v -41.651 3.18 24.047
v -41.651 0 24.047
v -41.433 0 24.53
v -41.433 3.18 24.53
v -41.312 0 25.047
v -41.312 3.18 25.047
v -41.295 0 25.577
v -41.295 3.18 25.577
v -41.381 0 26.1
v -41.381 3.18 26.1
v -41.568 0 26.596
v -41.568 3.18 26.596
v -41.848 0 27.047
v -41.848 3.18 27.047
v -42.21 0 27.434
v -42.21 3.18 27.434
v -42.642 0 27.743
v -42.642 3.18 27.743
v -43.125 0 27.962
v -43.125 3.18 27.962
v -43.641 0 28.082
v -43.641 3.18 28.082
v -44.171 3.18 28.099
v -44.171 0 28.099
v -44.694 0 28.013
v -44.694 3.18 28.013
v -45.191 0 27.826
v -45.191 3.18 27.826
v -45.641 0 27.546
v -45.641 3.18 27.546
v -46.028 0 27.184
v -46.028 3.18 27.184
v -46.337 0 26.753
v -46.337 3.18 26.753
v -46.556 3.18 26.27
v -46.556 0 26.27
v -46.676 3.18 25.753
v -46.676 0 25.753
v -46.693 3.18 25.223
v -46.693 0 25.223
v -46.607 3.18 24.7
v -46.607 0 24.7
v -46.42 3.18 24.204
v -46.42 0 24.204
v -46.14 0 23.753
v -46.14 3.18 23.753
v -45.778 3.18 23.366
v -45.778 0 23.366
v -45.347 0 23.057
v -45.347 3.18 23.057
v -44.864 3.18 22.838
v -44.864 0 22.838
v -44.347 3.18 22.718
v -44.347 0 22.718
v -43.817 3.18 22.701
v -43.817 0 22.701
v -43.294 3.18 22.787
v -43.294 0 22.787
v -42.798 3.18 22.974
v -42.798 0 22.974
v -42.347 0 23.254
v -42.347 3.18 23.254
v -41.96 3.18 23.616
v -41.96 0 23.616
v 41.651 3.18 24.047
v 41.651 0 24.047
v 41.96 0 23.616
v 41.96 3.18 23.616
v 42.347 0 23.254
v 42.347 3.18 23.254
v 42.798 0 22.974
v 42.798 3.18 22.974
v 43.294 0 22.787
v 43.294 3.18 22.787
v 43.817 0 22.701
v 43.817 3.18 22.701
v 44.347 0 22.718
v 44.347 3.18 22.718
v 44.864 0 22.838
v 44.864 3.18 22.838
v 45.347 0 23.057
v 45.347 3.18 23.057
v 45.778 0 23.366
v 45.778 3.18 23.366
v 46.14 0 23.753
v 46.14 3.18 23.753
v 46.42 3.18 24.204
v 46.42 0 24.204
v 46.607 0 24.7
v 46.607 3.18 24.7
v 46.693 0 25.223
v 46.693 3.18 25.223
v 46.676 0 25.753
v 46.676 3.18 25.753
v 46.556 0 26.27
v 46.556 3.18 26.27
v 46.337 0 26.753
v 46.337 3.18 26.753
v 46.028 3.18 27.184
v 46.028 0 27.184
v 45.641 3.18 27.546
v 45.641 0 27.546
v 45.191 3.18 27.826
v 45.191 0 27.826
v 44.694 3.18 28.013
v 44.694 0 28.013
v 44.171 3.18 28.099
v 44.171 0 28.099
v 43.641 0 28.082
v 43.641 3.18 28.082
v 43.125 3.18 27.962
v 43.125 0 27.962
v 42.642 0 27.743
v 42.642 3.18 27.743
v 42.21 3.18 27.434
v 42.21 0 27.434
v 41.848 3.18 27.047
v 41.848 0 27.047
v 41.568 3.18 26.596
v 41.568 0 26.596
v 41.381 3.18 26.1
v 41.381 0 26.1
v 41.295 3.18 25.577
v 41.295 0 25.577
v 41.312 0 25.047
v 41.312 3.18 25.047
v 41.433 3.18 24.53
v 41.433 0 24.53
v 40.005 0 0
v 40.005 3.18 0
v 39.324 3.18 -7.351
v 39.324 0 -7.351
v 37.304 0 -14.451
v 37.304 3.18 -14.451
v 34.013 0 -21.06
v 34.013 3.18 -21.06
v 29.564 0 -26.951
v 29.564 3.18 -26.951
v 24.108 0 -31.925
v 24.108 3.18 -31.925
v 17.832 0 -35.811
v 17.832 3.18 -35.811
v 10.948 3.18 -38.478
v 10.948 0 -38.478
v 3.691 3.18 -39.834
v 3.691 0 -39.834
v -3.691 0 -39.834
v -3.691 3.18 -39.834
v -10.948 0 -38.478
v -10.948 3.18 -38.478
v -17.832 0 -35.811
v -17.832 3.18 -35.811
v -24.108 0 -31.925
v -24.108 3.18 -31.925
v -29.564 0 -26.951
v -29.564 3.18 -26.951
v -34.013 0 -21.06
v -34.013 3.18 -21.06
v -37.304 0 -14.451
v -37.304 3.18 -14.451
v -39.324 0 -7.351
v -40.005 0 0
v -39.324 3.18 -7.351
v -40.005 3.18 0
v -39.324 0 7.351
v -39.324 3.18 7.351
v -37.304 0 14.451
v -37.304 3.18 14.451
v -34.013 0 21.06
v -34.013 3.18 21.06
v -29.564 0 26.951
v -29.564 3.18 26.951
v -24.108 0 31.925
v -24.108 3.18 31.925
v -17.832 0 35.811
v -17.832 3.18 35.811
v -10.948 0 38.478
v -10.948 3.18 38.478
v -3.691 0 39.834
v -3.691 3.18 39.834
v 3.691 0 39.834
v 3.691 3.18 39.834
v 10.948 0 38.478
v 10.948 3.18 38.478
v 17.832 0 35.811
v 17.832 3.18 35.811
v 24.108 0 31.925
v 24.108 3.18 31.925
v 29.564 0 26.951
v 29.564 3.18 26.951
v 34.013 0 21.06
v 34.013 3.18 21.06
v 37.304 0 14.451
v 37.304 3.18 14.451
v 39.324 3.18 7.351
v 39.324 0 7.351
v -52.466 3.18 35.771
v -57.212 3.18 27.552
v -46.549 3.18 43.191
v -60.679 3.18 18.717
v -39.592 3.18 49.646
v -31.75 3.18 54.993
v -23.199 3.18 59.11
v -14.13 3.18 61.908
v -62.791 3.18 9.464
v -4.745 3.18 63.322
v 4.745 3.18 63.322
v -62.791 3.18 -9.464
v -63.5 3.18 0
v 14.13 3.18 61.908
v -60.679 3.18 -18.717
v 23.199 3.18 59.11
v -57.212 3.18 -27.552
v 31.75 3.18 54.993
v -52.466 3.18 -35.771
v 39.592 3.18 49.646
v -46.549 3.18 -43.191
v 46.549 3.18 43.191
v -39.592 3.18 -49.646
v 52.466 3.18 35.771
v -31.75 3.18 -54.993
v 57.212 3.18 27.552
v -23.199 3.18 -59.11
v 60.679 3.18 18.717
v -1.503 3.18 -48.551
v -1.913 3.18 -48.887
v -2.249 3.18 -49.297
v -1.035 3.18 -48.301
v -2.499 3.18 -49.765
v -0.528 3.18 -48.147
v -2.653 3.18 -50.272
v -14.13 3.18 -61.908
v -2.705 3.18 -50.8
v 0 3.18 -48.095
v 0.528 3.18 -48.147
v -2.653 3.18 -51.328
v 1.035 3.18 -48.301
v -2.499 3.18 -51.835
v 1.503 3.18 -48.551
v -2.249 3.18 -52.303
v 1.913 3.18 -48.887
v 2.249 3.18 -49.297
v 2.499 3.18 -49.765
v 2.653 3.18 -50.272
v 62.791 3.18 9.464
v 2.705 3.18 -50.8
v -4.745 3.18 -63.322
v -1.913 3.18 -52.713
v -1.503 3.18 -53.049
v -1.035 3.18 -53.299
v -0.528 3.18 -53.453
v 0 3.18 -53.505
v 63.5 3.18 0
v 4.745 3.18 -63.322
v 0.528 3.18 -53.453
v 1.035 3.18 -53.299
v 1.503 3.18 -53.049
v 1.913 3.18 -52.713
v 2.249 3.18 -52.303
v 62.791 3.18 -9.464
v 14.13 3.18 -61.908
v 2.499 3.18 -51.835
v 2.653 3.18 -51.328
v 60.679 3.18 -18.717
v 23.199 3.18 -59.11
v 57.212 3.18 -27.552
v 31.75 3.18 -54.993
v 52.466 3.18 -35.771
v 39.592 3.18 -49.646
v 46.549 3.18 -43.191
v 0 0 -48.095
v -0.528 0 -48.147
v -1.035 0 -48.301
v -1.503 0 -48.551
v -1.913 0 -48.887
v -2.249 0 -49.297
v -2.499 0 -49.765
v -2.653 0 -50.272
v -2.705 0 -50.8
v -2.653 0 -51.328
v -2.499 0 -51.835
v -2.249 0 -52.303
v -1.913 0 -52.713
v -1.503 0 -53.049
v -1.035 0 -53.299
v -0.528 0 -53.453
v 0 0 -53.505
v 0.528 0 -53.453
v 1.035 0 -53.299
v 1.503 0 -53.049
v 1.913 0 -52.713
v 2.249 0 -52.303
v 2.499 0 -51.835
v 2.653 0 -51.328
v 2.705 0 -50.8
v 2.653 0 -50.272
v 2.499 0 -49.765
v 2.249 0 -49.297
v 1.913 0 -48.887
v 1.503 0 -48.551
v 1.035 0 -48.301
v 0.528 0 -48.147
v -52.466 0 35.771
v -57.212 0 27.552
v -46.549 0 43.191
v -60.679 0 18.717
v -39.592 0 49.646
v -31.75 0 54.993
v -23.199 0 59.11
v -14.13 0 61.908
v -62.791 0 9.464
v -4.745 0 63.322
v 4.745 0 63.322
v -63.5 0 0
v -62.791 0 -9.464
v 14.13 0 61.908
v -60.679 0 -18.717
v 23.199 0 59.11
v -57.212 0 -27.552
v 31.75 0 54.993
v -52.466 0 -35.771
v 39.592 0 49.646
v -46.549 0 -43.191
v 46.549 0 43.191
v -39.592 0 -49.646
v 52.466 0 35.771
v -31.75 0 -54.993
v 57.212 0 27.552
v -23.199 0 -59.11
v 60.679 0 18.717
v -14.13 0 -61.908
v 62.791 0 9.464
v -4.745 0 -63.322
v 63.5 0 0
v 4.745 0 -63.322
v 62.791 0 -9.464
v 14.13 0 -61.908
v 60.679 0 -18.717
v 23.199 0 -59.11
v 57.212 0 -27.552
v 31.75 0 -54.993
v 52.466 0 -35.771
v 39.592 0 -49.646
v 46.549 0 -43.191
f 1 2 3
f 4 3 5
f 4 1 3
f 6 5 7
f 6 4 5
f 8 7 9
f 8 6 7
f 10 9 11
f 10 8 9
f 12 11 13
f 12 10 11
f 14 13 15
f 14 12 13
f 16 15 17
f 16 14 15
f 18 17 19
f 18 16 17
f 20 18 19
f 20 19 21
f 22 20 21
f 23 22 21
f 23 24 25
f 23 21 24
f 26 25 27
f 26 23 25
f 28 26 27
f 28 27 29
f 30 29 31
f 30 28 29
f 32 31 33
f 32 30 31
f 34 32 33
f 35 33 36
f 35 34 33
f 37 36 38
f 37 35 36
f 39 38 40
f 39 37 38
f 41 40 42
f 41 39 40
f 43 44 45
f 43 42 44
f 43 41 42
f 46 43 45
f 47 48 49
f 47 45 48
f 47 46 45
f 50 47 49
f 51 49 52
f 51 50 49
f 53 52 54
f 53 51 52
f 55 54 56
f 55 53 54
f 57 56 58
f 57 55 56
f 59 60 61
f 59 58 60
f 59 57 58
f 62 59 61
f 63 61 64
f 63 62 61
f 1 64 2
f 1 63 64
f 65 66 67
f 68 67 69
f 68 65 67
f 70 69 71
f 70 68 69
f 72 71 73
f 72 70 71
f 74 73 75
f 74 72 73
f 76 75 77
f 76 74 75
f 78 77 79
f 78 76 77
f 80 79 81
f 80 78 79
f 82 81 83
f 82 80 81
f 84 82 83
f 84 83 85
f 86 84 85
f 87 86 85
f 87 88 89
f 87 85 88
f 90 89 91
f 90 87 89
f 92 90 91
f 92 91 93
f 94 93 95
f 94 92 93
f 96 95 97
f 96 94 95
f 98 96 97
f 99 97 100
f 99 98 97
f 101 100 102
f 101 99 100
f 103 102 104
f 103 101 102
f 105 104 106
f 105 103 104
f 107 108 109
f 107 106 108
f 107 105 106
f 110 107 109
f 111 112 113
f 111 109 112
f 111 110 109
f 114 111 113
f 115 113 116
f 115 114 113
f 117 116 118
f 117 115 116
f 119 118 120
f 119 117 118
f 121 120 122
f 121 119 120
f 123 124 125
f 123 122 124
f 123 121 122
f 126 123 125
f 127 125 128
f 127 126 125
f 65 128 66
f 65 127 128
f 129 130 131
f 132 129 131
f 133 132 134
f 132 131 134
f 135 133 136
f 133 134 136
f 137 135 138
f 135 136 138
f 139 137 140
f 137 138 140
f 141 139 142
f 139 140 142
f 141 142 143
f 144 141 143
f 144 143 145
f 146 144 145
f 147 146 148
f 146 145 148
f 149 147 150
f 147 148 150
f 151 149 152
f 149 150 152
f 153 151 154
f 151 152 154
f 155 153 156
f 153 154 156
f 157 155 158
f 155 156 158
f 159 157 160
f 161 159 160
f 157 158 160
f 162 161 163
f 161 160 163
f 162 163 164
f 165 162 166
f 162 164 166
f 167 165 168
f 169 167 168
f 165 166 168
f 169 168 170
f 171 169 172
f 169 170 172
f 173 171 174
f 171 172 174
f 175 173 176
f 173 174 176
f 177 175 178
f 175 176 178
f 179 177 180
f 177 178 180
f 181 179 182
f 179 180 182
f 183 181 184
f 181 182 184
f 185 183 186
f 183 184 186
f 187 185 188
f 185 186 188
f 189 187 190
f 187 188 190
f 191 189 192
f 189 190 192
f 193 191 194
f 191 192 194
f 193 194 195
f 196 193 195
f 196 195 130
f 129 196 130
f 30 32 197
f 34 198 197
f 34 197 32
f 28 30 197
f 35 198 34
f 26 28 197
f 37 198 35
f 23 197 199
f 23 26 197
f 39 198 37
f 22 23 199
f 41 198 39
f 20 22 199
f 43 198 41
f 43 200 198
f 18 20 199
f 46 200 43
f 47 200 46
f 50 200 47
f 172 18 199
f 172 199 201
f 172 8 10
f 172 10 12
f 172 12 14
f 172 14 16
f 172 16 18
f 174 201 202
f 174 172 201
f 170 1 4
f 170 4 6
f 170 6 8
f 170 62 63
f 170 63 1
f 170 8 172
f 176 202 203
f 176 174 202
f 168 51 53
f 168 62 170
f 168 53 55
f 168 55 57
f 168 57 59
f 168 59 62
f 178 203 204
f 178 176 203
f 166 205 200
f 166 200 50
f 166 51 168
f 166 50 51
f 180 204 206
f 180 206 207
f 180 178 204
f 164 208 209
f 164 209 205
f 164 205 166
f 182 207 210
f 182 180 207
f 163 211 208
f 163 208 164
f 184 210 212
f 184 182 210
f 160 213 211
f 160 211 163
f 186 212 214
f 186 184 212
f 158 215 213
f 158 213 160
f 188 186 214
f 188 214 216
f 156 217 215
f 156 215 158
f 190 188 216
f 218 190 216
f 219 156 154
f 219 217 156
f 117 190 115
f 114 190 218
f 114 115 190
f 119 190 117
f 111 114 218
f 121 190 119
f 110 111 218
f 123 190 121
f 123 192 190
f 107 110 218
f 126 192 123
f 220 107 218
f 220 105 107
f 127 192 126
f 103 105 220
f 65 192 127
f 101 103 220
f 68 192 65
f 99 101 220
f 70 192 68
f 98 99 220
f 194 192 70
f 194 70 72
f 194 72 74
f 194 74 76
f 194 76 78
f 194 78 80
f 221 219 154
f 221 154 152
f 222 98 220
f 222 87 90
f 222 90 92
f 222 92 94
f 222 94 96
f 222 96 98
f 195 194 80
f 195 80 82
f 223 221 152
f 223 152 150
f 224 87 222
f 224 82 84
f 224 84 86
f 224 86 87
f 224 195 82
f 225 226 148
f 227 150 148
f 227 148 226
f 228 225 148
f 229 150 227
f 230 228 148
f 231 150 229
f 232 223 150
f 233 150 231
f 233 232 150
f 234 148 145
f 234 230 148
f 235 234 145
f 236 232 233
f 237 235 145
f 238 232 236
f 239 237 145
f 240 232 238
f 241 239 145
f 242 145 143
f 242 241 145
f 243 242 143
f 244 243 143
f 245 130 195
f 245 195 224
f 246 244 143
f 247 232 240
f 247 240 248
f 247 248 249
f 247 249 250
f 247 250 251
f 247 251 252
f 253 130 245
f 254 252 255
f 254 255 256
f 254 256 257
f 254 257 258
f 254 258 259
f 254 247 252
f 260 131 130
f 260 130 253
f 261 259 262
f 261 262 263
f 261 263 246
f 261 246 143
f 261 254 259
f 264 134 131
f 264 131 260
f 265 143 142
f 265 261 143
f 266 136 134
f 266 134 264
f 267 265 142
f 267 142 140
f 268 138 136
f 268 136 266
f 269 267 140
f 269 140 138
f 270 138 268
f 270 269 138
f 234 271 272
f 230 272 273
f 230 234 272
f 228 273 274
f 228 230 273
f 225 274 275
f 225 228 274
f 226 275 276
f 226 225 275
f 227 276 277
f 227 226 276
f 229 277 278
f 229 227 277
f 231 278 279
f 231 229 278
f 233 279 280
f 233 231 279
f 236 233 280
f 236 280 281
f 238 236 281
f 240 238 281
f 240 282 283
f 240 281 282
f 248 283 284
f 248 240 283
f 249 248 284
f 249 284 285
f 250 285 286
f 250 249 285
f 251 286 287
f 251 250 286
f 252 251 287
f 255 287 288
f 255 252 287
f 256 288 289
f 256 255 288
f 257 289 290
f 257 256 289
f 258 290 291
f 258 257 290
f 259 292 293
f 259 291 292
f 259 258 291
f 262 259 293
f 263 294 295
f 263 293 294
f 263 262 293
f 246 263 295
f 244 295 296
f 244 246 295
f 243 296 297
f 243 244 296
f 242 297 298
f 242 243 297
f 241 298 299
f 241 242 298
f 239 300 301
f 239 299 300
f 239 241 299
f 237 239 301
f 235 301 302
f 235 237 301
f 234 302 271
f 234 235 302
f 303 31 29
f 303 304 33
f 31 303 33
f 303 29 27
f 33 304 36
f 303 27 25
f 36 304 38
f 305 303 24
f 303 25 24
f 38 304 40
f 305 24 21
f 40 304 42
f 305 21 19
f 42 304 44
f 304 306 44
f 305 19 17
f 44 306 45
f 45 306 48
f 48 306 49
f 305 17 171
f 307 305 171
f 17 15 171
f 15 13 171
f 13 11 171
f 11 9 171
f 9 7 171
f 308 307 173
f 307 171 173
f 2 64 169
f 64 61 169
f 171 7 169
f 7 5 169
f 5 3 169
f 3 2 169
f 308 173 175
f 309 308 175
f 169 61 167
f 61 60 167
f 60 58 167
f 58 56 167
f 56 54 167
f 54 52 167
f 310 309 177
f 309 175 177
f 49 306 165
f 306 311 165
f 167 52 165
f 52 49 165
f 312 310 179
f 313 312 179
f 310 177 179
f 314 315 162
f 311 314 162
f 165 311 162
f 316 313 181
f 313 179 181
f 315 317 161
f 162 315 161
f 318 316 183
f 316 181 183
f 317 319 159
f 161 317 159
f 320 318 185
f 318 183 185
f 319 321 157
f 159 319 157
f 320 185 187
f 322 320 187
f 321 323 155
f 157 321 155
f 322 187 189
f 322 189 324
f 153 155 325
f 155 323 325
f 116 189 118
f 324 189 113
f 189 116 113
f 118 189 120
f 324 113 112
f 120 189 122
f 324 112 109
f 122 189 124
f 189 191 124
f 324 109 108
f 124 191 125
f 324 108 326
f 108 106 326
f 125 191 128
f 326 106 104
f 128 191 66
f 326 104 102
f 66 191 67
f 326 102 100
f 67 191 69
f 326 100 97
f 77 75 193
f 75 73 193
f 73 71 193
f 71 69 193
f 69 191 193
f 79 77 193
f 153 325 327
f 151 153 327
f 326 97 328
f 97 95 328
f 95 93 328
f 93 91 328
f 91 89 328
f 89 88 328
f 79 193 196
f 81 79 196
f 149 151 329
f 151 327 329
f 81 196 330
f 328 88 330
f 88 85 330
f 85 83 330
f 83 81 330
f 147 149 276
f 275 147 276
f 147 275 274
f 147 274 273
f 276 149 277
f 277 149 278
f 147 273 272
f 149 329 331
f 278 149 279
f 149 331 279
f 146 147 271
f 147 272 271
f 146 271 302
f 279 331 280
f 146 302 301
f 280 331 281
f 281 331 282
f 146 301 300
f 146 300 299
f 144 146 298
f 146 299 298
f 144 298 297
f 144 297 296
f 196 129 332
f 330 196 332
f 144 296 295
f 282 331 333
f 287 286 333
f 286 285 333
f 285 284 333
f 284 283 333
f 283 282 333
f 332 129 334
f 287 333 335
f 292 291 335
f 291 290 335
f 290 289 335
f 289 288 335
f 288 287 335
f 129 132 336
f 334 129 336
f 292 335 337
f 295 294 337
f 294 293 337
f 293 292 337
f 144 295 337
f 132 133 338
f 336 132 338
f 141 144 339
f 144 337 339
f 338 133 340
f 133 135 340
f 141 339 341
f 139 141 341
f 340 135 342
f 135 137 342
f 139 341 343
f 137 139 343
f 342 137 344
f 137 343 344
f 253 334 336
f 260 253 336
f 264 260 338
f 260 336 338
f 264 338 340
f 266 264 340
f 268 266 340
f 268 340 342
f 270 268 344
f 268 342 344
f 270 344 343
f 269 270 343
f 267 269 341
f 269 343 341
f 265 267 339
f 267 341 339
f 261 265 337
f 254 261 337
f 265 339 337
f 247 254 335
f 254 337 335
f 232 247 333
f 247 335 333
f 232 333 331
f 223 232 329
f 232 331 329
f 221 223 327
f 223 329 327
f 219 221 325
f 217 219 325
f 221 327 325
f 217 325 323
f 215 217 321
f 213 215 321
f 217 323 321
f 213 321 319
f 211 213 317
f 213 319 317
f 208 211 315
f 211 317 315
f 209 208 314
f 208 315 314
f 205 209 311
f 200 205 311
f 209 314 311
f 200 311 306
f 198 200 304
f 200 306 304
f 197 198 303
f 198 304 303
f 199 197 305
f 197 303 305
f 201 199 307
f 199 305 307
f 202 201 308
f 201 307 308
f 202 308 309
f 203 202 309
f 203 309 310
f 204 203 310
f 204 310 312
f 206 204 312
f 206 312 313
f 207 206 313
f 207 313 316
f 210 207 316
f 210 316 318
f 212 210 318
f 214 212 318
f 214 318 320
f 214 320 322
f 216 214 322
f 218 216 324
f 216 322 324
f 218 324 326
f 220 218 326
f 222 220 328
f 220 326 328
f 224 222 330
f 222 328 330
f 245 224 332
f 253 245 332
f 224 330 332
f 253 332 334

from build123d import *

# Parameters (mm, degrees)
SKETCH1_R           = 63.5
BOSS_EXTRUDE1_DEPTH = 3.18
SKETCH2_R           = 40.005
CUT_EXTRUDE1_DEPTH  = 3.18
CIRPATTERN1_COUNT   = 3


with BuildPart() as part:
    # Sketch1 → Boss-Extrude1 (new body)
    with BuildSketch(Plane(origin=(0, 0, 0), x_dir=(1, 0, 0), z_dir=(0, 1, 0))):
        Circle(SKETCH1_R)
    extrude(amount=BOSS_EXTRUDE1_DEPTH)

    # Sketch2 → Cut-Extrude1 (cut)
    with BuildSketch(Plane(origin=(0, 3.18, 0), x_dir=(1, 0, 0), z_dir=(0, 1, 0))):
        Circle(SKETCH2_R)
    extrude(amount=-CUT_EXTRUDE1_DEPTH, mode=Mode.SUBTRACT)

    # Sketch7 → Hole for #8 300® SC Nuts (SP)1 (revolve, cut)
    with BuildSketch(Plane(origin=(0, 3.18, -50.8), x_dir=(0, 0, 1), z_dir=(1, 0, 0))):
        Polygon((0, 0), (0, 21.375388061), (2.7051, 19.75), (2.7051, 0), align=None)
    hole_for_8_300_sc_nuts_sp_1 = revolve(axis=Axis((0, 9.53, -50.8), (0, -1, 0)), mode=Mode.SUBTRACT)

    # CirPattern1: Hole for #8 300® SC Nuts (SP)1 ×3 about axis
    cirpattern1_axis = Axis((0, 0, 0), (0, 1, 0))
    for i in range(1, CIRPATTERN1_COUNT):
        add(hole_for_8_300_sc_nuts_sp_1.rotate(cirpattern1_axis, i * 360 / CIRPATTERN1_COUNT), mode=Mode.SUBTRACT)


solid = part.part
